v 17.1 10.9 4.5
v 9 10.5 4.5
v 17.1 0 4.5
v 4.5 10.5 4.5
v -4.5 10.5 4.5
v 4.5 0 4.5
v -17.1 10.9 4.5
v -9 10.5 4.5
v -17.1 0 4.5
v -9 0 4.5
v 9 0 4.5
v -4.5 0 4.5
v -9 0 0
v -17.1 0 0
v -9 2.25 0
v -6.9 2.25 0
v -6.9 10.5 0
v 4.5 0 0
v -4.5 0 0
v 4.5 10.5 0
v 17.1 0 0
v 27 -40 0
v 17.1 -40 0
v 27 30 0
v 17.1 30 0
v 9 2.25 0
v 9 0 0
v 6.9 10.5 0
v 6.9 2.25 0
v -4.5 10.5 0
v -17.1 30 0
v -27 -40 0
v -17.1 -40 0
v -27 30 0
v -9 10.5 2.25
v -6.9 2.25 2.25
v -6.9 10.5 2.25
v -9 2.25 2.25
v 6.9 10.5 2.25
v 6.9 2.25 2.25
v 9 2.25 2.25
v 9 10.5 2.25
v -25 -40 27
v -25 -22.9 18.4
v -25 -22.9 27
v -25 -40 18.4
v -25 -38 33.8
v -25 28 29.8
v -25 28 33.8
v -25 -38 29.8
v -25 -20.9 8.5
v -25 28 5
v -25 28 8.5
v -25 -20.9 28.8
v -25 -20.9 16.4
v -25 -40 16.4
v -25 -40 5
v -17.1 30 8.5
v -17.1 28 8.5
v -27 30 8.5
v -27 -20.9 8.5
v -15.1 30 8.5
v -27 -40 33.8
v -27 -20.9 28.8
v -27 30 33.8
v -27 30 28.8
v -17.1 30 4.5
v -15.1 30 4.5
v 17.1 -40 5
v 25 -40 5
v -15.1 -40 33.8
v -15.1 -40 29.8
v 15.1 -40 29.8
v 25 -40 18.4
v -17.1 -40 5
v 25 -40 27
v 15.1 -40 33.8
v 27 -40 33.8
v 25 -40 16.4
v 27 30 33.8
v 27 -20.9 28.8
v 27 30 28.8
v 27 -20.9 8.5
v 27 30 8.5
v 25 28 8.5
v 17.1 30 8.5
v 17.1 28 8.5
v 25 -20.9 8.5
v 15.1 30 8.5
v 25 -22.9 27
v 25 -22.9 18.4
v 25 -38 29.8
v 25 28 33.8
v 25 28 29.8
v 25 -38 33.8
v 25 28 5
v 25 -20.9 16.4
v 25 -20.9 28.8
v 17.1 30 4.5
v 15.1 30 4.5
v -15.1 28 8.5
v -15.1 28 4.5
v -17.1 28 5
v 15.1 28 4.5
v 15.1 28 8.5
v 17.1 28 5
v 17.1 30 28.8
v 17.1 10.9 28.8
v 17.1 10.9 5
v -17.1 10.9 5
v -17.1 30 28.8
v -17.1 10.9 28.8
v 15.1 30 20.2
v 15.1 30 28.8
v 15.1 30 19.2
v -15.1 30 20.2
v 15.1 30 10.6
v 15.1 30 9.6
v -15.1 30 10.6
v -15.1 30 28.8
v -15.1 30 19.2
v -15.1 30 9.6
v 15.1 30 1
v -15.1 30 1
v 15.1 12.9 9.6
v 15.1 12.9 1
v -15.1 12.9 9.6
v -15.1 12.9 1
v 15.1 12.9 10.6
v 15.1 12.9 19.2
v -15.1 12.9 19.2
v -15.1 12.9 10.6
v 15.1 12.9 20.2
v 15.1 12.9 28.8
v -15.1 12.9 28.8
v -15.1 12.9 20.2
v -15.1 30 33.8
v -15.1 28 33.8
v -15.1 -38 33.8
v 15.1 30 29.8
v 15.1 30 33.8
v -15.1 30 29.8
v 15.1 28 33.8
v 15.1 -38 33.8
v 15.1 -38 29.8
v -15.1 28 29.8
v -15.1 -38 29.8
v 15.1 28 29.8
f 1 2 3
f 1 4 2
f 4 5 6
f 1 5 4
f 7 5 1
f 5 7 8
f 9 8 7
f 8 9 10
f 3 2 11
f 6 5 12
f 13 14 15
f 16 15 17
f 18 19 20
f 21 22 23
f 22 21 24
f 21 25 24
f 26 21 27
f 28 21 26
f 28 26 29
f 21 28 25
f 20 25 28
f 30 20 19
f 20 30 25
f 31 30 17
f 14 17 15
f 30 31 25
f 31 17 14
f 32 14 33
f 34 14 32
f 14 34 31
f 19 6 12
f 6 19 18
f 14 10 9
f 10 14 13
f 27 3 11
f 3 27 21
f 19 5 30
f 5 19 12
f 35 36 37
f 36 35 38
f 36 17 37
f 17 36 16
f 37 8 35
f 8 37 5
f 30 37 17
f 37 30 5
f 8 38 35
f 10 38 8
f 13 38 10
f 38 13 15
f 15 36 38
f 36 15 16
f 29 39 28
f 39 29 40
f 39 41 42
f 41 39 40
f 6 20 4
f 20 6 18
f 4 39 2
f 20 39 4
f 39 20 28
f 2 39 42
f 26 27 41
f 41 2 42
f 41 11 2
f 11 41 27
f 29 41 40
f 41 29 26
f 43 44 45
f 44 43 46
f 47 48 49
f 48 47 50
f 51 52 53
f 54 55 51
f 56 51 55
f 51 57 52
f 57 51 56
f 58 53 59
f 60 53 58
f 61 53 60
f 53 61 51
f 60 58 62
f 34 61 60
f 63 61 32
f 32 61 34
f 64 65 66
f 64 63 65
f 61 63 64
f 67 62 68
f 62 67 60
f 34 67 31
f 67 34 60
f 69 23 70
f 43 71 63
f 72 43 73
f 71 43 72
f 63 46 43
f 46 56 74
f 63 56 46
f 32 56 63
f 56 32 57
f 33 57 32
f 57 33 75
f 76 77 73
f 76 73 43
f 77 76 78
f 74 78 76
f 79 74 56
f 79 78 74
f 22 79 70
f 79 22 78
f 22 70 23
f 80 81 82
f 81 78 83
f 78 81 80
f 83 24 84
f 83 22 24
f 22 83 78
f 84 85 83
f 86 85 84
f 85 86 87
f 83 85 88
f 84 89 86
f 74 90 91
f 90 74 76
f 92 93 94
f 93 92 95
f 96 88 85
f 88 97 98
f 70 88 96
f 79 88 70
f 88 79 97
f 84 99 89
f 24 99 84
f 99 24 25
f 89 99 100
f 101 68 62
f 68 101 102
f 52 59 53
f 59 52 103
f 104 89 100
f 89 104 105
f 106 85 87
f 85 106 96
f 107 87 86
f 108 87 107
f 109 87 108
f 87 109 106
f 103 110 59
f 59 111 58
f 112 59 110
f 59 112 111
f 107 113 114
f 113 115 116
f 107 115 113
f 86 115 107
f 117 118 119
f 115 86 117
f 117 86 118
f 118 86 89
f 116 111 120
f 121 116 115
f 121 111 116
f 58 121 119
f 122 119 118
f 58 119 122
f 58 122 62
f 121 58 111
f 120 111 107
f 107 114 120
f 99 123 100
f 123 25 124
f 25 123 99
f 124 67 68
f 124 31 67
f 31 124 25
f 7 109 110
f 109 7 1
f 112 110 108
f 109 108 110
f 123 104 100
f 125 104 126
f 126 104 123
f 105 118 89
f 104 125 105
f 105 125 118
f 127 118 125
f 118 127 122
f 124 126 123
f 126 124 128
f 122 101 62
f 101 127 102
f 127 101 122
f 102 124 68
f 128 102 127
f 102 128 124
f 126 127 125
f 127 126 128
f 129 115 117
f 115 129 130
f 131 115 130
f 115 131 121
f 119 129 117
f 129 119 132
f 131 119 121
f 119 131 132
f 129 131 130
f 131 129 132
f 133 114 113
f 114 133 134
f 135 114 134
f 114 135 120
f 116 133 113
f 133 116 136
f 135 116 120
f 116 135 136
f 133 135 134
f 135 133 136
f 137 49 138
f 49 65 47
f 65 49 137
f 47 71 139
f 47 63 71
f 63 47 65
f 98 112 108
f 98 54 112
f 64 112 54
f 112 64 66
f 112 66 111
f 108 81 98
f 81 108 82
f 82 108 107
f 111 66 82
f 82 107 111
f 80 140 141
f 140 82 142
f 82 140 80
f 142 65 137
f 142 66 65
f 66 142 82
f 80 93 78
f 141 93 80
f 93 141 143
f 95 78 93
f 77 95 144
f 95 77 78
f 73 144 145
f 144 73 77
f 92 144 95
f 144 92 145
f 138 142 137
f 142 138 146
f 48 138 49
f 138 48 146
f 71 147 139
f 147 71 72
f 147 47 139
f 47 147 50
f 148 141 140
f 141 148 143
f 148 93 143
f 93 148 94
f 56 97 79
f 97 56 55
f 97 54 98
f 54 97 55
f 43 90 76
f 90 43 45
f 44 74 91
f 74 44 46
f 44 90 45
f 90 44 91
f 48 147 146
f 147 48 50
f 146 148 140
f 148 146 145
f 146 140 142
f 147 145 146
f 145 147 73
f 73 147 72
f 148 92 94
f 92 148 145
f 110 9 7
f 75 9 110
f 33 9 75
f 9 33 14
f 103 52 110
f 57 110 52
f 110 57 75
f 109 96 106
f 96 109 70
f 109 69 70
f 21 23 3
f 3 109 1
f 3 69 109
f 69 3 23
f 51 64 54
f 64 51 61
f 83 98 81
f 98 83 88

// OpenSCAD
fullContactorWidth=45; /*45.3*/
centerWingWidth=18;
centerInnerWingWidth=14;
centerInnerGap=9; /*8.9*/
centerOuterGap=22;
centerToPortEdge = centerOuterGap;
centerWingWall=2.25;
centerWingDepth=10.5;
centerWingSlotDepth=7;
centerToFarEdge = 19;
slotGap = 0.15;
pcbWidth=50;
pcbLength=66;
zeroOffsetToContactorCenter=-5;
pcbWallWidth=2;
pcbClearance=0.5;
pcbClearanceTop=1;
sideWidth = (fullContactorWidth - centerOuterGap) / 2 - centerWingWall;
gapWidth = fullContactorWidth / 2 - sideWidth;
verticalSupportWidth = 20;

wago221s415 = [30.2, 18.6 - 1.5, 8.6];
wago221s413 = [18.7, 18.6 - 1.5, 8.4];
wagoWallWidthH = 1;
wagoWallWidthV = 2;

psuHeight = 3 * wagoWallWidthH + 3 * wago221s415[2];/*22.5*/
echo(psuHeight);

difference() {
    translate([-fullContactorWidth / 2, 0, 0]) {
        union() {
            sideWidth = (fullContactorWidth - centerOuterGap) / 2 - centerWingWall;
            cube([fullContactorWidth, centerToFarEdge / 2 + 3, 2 * centerWingWall]);
            /*
            translate([0, -centerToFarEdge,0]) {
                #cube([sideWidth, centerToFarEdge, 2 * centerWingWall]);
            }
            translate([fullContactorWidth - sideWidth, -centerToFarEdge,0]) {
                cube([sideWidth, centerToFarEdge, 2 * centerWingWall]);
            }
            */
        }
    }
    translate([-centerInnerGap / 2 - centerWingWall - slotGap, 0, 0]) {
        cube([centerWingWall + slotGap, centerWingDepth, centerWingWall]);
    }

    translate([-centerInnerGap / 2 - 2 * centerWingWall, 0, 0]) {
        cube([centerWingWall, centerWingWall, centerWingWall]);
    }

    translate([centerInnerGap / 2, 0, 0]) {
        cube([centerWingWall + slotGap, centerWingDepth, centerWingWall]);
    }

    translate([centerInnerGap / 2 + 1 * centerWingWall, 0, 0]) {
        cube([centerWingWall, centerWingWall, centerWingWall]);
    }

    translate([-centerInnerGap / 2 - (centerWingWall * 2), 0, centerWingWall]) {
        cube([2 * centerWingWall, centerWingDepth, centerWingWall]);
    }

    translate([centerInnerGap / 2 - (centerWingWall * 0), 0, centerWingWall]) {
        cube([2 * centerWingWall, centerWingDepth, centerWingWall]);
    }
}

halfWidthNotWago = (pcbWidth - wago221s415[0] - 2 * wagoWallWidthV)/2;

translate([-pcbWidth / 2 - pcbWallWidth, -pcbLength / 2 + zeroOffsetToContactorCenter - pcbWallWidth, 0]) {
    cube([pcbWallWidth + halfWidthNotWago , pcbLength + 2 * pcbWallWidth, centerWingWall * 2 + pcbClearance]);
}


translate([pcbWidth / 2 - halfWidthNotWago , -pcbLength / 2 + zeroOffsetToContactorCenter - pcbWallWidth, 0]) {
    cube([pcbWallWidth + halfWidthNotWago, pcbLength + 2 * pcbWallWidth, centerWingWall * 2 + pcbClearance]);
}

pcbWalls(showEnds=false);

/*
translate([-pcbWidth / 2 - pcbWallWidth, zeroOffsetToContactorCenter - verticalSupportWidth / 2, centerWingWall * 2]) {
    cube([pcbWallWidth, verticalSupportWidth, psuHeight]);
}

translate([pcbWidth / 2, zeroOffsetToContactorCenter - verticalSupportWidth / 2, centerWingWall * 2]) {
    cube([pcbWallWidth, verticalSupportWidth, psuHeight]);
}
*/

translate([-(wago221s415[0] + 2 * wagoWallWidthV) / 2, pcbLength / 2 + zeroOffsetToContactorCenter - (wago221s415[1] + wagoWallWidthV) + pcbWallWidth, /*centerWingWall * 2 + pcbClearance*/]){
    wagoPort415();
    translate([0, 0, wagoWallWidthH + wago221s415[2]]) {
        wagoPort415();
    }
    translate([0, 0, 2 * wagoWallWidthH + 2 * wago221s415[2]]) {
        wagoPort415();
    }
}

translate([0,0, psuHeight]) {
    translate([-pcbWidth / 2 - pcbWallWidth, zeroOffsetToContactorCenter - pcbLength / 2 - pcbWallWidth,0]) {
        #cube([pcbWidth + 2 * pcbWallWidth, pcbLength + 2 * pcbWallWidth, pcbClearanceTop]);
    }
    translate([0,0,-2 * centerWingWall]){
        pcbWalls(extraHeight=pcbClearanceTop);
    }

    translate([-pcbWidth/2 - pcbWallWidth, zeroOffsetToContactorCenter - pcbLength / 2 - pcbWallWidth, -wago221s413[2] - pcbWallWidth * 2 ]) {
        maxWidthPort();
    }
}

translate([-pcbWidth / 2 - pcbWallWidth, zeroOffsetToContactorCenter -pcbLength / 2 - pcbWallWidth, centerWingWall * 2]) {
    cube([pcbWallWidth, pcbWallWidth + wago221s415[1], psuHeight - 1]);
}

translate([pcbWidth / 2, zeroOffsetToContactorCenter -pcbLength / 2 - pcbWallWidth, centerWingWall * 2]) {
    cube([pcbWallWidth, pcbWallWidth + wago221s415[1], psuHeight - 1]);
}
/*
translate([pcbWidth / 2, zeroOffsetToContactorCenter - verticalSupportWidth / 2, centerWingWall * 2]) {
    cube([pcbWallWidth, verticalSupportWidth, psuHeight]);
}
*/

module pcbWalls(showEnds=true,extraHeight = 0) {
    wallGap = wago221s415[0]/2;

    translate([-pcbWidth / 2 - pcbWallWidth, -pcbLength / 2 + zeroOffsetToContactorCenter - pcbWallWidth, centerWingWall * 2]) {
        cube([pcbWallWidth, pcbLength + 2 * pcbWallWidth, pcbWallWidth * 2 + extraHeight]);
    }

    translate([pcbWidth / 2 , -pcbLength / 2 + zeroOffsetToContactorCenter - pcbWallWidth, centerWingWall * 2]) {
        cube([pcbWallWidth, pcbLength + 2 * pcbWallWidth, pcbWallWidth * 2 + extraHeight]);
    }

    if (showEnds) {
        translate([pcbWidth / 2 - (pcbWidth / 2 - wallGap) , -pcbLength / 2 + zeroOffsetToContactorCenter - pcbWallWidth,centerWingWall * 2]) {
           cube([pcbWallWidth + (pcbWidth / 2 - wallGap), pcbWallWidth, pcbWallWidth * 2 + extraHeight]);
        }
    }

    translate([-pcbWidth / 2 - pcbWallWidth , pcbLength / 2 + zeroOffsetToContactorCenter,centerWingWall * 2]) {
       cube([pcbWallWidth + (pcbWidth / 2 - wallGap), pcbWallWidth, pcbWallWidth * 2 + extraHeight]);
    }

    if (showEnds) {
        translate([-pcbWidth / 2 - pcbWallWidth , -pcbLength / 2 + zeroOffsetToContactorCenter - pcbWallWidth,centerWingWall * 2]) {
           cube([pcbWallWidth + (pcbWidth / 2 - wallGap), pcbWallWidth, pcbWallWidth * 2 + extraHeight]);
        }
    }

    translate([pcbWidth / 2 - (pcbWidth / 2 - wallGap) , pcbLength / 2 + zeroOffsetToContactorCenter,centerWingWall * 2]) {
       cube([pcbWallWidth + (pcbWidth / 2 - wallGap), pcbWallWidth, pcbWallWidth * 2 + extraHeight]);
    }
}

module wagoPort415() {  
    difference(){
        cube([wago221s415[0] + 2 * wagoWallWidthV, wago221s415[1] + wagoWallWidthV, wago221s415[2] + 2 * wagoWallWidthH]);
        translate([wagoWallWidthV, wagoWallWidthV, wagoWallWidthH]) {
            cube([wago221s415[0], wago221s415[1] + 0.01, wago221s415[2]]);
        }
    }
}

module maxWidthPort() {
    difference() {
        cube([pcbWallWidth * 2 + pcbWidth, wago221s415[1] + pcbWallWidth, wago221s415[2] + 2 * pcbWallWidth]);
        translate([pcbWallWidth, -0.01, pcbWallWidth]) {
            cube([pcbWidth, wago221s415[1] + 0.01, wago221s415[2]]);
        }
    }
}
